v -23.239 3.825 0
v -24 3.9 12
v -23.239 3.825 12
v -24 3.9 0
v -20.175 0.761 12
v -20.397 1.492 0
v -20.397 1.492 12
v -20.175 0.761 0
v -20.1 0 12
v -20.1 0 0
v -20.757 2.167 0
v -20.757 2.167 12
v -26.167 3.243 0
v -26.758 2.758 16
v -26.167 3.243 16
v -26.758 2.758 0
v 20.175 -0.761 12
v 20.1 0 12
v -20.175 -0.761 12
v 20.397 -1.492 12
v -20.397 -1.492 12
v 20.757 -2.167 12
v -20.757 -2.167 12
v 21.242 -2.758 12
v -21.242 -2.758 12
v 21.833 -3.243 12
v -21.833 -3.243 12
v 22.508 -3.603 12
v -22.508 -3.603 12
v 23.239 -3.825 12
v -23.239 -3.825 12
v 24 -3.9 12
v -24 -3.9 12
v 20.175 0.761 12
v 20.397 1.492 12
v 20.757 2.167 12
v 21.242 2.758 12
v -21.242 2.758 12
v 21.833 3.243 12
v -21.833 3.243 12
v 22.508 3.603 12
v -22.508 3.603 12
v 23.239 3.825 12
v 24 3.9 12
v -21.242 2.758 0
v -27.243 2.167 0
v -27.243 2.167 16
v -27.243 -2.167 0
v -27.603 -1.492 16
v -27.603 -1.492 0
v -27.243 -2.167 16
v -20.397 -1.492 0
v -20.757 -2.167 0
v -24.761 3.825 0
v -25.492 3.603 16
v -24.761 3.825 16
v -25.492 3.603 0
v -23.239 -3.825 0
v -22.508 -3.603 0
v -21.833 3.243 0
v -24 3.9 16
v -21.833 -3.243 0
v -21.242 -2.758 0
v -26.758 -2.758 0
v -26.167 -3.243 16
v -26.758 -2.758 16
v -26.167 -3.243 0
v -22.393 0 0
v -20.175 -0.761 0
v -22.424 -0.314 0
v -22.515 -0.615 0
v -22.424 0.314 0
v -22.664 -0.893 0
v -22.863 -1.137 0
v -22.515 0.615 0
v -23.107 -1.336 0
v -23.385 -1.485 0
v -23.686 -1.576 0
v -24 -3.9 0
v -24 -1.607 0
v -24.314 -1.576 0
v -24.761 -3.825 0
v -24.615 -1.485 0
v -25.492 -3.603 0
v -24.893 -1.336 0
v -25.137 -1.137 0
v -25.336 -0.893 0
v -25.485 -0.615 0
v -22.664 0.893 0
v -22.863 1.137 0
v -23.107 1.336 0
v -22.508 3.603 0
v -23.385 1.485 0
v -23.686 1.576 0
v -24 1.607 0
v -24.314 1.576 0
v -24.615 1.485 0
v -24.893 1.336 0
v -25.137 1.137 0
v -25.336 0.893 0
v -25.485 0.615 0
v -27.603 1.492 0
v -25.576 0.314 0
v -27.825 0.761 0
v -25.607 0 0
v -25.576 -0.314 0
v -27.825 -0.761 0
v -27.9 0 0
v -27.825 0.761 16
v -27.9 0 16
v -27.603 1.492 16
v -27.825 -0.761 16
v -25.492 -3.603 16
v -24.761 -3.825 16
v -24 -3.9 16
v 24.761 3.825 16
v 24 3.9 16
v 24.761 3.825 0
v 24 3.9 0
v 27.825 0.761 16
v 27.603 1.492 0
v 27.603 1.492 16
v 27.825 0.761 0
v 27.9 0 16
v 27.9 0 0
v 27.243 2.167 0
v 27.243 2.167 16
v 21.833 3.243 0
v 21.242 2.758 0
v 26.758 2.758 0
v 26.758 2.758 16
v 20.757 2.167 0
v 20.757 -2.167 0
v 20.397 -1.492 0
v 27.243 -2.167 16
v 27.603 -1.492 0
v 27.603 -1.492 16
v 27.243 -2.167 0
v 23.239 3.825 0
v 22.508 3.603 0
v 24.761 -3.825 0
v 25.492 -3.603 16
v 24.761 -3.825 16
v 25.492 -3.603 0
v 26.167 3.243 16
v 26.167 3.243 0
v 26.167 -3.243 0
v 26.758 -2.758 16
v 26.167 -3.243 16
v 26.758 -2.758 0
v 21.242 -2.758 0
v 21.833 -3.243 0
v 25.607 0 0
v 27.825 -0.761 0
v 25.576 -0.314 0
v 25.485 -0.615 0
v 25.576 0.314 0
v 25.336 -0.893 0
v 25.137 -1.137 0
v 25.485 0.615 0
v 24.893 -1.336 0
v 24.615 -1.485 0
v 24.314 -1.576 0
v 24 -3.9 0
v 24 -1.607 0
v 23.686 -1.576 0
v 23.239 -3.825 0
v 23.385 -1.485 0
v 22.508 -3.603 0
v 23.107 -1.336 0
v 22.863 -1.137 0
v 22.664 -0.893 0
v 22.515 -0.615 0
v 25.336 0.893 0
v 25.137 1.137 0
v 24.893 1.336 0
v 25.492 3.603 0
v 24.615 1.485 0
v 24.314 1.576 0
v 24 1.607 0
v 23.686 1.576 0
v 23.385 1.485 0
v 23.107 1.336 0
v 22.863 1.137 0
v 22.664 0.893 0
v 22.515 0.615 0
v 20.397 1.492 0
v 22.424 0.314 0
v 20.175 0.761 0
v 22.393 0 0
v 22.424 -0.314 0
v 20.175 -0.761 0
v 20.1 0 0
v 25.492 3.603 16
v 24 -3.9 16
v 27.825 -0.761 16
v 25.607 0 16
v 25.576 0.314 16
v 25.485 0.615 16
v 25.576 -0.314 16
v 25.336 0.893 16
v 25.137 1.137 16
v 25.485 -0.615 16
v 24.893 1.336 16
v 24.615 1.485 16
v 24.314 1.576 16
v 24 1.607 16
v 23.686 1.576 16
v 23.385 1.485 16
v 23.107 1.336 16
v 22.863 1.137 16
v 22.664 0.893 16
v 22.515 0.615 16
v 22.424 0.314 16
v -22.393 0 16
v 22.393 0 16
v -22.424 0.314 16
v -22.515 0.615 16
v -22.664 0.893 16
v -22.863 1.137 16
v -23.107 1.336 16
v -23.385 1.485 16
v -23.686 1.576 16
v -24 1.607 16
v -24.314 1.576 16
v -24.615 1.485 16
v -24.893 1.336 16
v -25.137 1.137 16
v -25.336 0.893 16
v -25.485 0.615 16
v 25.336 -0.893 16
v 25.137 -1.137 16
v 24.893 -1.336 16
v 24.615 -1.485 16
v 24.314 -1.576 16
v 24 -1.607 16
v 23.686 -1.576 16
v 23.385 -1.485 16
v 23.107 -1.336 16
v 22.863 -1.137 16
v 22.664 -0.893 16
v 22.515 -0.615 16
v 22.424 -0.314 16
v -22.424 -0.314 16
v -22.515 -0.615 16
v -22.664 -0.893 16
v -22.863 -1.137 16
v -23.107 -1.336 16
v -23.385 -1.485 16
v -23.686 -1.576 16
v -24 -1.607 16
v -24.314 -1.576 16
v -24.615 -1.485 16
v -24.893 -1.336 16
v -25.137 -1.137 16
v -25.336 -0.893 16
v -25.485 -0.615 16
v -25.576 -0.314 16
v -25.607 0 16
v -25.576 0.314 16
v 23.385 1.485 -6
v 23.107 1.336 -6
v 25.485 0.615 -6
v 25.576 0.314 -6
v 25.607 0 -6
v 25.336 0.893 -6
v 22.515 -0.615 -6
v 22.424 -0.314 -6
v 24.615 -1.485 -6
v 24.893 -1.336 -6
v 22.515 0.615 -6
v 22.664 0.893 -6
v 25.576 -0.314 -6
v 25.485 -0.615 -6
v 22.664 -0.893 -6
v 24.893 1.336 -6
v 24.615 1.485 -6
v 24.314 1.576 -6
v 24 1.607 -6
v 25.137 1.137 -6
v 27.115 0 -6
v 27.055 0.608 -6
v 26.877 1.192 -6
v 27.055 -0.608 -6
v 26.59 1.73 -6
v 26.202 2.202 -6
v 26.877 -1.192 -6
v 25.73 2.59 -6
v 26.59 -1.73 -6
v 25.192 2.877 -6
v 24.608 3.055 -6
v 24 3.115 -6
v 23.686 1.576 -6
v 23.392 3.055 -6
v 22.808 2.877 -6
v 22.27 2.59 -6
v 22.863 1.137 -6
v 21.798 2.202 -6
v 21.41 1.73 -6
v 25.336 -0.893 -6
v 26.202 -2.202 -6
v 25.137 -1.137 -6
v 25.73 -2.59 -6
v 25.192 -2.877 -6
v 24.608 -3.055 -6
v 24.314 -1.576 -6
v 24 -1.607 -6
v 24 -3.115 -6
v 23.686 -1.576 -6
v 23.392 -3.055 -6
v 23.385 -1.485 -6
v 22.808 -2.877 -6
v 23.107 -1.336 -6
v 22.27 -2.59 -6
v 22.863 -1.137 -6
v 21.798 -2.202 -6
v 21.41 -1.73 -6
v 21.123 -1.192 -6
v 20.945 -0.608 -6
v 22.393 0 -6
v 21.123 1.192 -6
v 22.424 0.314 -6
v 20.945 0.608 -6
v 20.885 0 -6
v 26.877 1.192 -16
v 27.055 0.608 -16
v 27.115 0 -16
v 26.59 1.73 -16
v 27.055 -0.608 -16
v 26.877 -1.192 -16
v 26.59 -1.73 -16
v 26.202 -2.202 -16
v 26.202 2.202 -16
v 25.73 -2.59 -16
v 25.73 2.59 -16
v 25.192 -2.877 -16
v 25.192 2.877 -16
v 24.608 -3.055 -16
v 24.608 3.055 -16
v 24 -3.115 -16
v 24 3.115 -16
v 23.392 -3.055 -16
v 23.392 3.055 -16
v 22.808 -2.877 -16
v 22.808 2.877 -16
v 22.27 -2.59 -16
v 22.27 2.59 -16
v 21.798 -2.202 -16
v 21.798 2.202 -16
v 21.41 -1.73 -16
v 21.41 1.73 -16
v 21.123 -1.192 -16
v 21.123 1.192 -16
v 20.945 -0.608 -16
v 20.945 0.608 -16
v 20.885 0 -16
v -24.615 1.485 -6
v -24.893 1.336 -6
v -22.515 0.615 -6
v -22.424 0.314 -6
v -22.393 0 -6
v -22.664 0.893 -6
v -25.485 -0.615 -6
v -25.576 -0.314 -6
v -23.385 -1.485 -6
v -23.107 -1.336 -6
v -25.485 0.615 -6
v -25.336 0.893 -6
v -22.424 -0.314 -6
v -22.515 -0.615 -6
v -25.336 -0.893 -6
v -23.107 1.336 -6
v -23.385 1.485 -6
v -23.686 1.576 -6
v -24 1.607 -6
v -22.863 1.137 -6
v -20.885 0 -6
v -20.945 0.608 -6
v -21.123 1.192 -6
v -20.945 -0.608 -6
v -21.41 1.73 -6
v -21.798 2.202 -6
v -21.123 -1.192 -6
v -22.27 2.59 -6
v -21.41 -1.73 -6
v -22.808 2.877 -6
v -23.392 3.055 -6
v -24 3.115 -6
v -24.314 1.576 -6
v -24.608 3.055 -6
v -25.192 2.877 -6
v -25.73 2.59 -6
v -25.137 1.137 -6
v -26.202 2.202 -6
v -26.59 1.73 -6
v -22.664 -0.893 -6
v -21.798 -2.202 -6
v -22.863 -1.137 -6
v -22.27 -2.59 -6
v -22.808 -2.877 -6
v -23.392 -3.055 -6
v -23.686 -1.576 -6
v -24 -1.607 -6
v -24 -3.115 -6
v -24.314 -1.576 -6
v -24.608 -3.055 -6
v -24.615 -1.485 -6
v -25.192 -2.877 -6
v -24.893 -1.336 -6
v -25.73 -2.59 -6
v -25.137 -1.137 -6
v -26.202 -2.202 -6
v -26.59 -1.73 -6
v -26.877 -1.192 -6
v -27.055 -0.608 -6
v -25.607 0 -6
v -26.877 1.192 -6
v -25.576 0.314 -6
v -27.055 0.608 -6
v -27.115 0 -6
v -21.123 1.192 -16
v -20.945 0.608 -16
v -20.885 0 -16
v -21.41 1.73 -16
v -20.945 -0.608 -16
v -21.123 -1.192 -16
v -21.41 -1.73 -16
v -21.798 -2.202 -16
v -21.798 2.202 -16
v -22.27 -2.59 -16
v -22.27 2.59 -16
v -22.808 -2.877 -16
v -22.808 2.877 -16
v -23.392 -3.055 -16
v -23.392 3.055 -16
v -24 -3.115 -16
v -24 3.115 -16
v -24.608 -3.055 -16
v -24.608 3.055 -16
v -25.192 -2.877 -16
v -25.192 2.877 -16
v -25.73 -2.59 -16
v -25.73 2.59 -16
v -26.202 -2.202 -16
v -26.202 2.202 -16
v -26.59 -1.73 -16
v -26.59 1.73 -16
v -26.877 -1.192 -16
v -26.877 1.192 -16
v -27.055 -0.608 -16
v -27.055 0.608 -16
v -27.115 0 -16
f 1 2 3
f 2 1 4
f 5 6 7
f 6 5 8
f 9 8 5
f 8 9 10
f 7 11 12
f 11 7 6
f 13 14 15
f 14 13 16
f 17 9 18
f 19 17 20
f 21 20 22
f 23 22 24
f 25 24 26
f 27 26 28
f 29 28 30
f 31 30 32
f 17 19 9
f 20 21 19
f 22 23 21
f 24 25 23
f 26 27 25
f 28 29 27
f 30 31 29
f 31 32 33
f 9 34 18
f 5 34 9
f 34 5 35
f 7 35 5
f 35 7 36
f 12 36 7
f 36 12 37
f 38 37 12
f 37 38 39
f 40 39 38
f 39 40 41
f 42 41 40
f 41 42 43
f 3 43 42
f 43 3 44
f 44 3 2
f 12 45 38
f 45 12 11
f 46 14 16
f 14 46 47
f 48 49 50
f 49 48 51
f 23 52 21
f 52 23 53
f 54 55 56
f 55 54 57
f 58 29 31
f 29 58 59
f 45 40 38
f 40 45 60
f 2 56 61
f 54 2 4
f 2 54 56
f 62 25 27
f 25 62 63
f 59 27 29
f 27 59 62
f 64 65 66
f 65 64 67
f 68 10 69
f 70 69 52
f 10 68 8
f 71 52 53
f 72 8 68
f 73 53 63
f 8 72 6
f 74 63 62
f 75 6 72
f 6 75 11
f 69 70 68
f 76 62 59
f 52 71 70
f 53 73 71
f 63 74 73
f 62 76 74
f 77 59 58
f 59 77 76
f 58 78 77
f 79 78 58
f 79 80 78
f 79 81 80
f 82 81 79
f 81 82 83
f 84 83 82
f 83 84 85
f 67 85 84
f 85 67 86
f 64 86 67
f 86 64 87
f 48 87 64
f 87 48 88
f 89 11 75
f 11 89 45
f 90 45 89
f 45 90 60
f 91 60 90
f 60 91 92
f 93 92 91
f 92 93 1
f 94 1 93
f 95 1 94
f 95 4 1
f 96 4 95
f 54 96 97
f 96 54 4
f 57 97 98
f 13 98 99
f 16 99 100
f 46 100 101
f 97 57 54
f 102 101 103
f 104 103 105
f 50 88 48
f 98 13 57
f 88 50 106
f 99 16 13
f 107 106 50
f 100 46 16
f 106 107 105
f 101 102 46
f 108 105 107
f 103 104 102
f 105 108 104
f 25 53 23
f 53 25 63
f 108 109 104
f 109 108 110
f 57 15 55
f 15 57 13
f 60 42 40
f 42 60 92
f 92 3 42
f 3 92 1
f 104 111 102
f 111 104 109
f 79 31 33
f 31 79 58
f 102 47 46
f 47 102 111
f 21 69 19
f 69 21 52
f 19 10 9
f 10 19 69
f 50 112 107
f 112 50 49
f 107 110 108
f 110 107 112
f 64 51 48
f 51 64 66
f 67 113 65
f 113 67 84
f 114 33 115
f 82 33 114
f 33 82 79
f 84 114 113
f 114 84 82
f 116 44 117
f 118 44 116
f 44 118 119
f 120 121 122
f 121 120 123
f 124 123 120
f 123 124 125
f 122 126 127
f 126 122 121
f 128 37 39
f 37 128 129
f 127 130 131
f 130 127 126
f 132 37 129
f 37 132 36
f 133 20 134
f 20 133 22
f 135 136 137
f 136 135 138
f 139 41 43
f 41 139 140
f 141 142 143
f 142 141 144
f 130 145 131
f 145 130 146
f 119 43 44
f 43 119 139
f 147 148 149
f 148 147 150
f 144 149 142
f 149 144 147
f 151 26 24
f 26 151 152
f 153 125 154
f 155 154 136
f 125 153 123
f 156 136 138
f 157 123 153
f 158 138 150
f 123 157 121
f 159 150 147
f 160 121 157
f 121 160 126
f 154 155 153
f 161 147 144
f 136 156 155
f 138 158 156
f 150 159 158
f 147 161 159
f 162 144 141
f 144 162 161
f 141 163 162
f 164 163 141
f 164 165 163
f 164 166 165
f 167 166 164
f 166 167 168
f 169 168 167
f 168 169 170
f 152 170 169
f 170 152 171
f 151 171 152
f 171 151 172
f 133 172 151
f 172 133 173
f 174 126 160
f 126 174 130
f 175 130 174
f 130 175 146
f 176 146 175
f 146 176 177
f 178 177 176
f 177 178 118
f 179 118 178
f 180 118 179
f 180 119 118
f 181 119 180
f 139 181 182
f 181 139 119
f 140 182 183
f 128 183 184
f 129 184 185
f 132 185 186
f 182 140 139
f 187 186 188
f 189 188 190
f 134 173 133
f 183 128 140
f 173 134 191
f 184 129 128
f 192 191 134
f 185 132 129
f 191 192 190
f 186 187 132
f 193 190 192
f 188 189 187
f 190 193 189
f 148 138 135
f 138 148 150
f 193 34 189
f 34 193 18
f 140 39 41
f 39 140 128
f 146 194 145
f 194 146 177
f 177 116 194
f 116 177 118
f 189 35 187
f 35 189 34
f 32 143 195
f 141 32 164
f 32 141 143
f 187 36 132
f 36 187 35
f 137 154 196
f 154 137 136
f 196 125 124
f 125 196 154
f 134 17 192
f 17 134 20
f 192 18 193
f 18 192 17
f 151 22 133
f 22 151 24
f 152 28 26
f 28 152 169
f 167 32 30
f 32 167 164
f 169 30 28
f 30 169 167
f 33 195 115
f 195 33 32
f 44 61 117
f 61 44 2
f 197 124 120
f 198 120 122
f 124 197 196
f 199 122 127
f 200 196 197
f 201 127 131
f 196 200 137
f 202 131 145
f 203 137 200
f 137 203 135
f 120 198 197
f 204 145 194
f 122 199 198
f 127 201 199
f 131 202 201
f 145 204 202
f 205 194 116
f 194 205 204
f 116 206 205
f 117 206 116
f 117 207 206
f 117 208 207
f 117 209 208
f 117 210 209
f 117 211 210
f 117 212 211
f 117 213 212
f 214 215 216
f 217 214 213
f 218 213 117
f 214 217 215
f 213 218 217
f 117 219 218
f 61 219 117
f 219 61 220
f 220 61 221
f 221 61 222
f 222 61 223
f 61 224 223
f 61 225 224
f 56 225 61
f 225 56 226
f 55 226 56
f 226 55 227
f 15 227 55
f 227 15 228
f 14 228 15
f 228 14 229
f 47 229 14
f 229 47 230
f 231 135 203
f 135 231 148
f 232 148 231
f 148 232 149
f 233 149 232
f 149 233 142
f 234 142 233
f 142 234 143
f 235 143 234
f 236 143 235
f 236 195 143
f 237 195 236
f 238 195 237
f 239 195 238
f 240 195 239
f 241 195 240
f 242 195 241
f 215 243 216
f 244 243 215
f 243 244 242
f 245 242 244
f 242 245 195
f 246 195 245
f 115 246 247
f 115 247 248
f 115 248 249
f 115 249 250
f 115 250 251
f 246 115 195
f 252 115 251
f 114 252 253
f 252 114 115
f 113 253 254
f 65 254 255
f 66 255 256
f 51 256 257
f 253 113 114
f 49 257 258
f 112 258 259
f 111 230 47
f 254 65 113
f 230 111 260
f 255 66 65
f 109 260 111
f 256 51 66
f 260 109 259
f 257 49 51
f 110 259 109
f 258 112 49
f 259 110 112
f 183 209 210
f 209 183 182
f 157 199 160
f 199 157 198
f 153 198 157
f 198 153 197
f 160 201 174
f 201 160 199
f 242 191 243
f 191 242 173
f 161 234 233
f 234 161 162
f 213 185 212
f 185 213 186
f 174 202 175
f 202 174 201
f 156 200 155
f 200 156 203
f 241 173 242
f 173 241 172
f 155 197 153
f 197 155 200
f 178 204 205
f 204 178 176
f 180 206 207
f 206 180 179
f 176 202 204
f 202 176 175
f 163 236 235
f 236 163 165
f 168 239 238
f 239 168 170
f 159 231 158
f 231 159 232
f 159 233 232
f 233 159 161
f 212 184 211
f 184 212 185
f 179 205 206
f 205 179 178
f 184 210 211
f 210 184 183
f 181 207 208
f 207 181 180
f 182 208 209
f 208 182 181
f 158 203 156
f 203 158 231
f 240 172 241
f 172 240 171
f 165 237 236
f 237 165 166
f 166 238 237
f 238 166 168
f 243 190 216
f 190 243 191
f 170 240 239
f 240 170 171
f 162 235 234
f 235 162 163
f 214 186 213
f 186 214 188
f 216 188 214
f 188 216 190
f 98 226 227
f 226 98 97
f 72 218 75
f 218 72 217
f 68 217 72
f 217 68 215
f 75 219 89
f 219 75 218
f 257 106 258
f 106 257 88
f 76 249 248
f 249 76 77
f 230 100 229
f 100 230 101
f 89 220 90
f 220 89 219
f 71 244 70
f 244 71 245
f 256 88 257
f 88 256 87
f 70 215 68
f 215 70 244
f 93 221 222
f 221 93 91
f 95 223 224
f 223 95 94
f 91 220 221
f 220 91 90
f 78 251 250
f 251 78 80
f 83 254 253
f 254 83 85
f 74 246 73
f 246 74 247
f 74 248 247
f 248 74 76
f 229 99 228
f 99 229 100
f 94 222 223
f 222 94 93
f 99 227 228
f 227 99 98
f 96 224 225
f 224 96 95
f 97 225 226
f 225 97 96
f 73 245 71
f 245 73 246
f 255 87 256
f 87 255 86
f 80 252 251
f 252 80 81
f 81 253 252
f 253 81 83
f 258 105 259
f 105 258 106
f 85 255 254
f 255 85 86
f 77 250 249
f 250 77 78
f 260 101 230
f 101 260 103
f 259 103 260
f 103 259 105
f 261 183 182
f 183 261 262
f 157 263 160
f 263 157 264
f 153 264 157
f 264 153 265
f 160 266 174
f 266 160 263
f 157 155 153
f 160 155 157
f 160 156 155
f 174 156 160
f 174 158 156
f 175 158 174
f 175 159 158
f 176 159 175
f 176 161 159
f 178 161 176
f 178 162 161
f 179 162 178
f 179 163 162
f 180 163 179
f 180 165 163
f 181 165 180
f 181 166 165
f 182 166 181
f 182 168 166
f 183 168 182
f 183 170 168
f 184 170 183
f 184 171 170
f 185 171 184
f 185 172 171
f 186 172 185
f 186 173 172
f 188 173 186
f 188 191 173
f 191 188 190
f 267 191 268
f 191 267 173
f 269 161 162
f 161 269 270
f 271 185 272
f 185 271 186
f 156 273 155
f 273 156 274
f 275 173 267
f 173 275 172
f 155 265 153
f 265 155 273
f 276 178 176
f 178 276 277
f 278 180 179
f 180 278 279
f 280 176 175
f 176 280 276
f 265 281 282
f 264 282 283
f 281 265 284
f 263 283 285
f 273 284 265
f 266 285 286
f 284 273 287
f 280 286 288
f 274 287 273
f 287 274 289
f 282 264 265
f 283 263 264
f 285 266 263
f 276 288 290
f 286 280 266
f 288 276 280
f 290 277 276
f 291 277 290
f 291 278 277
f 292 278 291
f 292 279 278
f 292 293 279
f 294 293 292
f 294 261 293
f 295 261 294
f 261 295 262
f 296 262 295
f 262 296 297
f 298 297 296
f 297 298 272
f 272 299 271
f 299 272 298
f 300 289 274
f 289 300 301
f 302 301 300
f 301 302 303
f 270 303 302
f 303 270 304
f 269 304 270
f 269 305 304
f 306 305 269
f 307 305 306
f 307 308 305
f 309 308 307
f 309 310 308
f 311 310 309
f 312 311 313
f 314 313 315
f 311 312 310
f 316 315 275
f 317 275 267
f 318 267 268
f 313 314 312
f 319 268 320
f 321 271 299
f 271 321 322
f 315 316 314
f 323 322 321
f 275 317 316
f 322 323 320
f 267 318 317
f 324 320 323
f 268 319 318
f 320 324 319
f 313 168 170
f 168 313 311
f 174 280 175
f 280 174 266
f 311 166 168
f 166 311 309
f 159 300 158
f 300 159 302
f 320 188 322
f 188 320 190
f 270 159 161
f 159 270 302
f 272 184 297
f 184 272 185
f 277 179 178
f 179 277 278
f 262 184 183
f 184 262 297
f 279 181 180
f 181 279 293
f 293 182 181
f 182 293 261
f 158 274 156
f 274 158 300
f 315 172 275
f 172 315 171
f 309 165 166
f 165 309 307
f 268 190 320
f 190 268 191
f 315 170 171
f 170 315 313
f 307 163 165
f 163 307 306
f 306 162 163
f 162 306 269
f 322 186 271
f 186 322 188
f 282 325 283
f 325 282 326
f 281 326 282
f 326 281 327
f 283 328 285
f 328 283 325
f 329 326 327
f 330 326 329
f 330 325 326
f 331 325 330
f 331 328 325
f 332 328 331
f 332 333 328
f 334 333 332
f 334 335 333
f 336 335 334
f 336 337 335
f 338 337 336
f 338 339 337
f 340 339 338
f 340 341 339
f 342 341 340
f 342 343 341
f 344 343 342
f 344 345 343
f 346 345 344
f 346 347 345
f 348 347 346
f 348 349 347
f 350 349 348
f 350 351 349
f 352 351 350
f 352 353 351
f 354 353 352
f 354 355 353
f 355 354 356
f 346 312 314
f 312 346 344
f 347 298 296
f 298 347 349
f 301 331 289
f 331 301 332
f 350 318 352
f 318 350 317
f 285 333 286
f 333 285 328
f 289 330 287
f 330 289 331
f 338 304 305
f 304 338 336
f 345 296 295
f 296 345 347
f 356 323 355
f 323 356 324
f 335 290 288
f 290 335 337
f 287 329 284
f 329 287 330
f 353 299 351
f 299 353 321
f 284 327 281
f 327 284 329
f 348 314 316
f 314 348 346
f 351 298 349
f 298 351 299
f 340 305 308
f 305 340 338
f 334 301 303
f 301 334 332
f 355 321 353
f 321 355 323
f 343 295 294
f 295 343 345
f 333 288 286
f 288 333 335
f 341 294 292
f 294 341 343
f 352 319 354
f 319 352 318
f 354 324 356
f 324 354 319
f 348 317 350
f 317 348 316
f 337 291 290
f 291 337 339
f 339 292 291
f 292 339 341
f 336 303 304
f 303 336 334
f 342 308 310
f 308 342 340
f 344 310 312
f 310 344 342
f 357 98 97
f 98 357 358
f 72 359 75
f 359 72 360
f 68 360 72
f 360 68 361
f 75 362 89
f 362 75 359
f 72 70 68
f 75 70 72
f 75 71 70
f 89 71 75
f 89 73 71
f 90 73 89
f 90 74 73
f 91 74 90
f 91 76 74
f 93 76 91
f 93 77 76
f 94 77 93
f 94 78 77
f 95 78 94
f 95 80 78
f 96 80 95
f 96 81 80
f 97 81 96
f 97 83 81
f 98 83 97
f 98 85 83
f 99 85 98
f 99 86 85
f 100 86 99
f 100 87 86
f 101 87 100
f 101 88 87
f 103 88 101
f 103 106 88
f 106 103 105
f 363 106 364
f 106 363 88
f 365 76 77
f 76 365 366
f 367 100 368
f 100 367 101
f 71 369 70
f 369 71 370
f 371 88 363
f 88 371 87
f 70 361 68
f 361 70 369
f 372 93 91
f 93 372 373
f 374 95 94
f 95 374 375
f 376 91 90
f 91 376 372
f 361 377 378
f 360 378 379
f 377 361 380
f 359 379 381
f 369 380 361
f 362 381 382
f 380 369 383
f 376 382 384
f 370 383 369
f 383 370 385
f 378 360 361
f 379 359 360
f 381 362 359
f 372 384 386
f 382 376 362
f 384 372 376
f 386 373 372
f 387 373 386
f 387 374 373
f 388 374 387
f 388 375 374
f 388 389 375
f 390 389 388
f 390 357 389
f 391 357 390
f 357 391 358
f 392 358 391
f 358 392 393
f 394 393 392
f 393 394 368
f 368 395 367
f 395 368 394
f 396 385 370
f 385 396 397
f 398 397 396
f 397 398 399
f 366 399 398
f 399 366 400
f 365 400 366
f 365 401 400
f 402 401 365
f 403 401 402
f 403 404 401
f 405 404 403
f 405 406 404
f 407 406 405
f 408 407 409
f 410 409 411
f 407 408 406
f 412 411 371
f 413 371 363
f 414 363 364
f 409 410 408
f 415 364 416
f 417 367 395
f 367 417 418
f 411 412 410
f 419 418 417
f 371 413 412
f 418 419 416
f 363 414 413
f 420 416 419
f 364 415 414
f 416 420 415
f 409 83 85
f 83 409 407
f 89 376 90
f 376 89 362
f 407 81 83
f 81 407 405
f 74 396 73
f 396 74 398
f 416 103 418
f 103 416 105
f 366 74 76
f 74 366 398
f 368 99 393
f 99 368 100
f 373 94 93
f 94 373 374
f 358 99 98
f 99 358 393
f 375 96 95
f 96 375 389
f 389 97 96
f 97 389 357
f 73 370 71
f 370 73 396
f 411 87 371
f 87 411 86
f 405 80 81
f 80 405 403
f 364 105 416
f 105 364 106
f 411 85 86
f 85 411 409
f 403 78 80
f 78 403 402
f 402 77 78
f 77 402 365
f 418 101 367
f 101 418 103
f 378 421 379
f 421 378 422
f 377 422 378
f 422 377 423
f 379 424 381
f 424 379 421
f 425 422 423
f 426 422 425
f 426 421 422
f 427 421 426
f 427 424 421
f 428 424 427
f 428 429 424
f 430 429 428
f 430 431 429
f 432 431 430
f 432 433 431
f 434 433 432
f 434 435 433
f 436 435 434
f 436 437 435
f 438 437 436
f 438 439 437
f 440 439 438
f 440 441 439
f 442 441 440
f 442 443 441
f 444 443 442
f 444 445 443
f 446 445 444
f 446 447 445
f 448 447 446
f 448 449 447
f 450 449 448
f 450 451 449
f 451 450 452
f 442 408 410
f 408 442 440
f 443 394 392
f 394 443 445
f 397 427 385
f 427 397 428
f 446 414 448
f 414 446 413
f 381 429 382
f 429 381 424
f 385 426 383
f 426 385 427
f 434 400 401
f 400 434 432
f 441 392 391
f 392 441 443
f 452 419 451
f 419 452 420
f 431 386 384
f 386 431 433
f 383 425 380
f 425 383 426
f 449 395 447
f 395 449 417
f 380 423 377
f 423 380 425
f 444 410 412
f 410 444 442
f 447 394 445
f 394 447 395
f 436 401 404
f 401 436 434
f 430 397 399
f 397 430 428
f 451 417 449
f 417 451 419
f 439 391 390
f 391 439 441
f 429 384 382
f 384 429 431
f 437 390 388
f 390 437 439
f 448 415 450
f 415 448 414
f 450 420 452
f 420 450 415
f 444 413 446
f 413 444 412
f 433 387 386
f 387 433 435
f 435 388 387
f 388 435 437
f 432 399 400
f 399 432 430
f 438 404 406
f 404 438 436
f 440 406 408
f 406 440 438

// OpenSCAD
// file: zcube.scad
// This function creates a cube with a given x/y either above (f=1) or below (f=-1) the z axis.
module zcube(dimensions, z=0, f=1) {
	translate([0, 0, dimensions[2]/2 * f + z]) cube(dimensions, true);
}

module zring(dimensions, thickness, z=0, f=1) {
	render() difference() {
		zcube([dimensions[0]+thickness/2, dimensions[1]+thickness/2, dimensions[2]], z=z, f=f);
		zcube([dimensions[0]-thickness/2, dimensions[1]-thickness/2, dimensions[2]], z=z, f=f);
	}
}

module rcube(dimensions, d = 1, z=0, f=1) {
	dx = dimensions[0]/2 - d/2;
	dy = dimensions[1]/2 - d/2;
	dz = dimensions[2]/2 * (f-1) + z;
	
	hull() {
		translate([-dx, -dy, dz]) cylinder(h=dimensions[2], d=d);
		translate([-dx, dy, dz]) cylinder(h=dimensions[2], d=d);
		translate([dx, -dy, dz]) cylinder(h=dimensions[2], d=d);
		translate([dx, dy, dz]) cylinder(h=dimensions[2], d=d);
	}
}

module zcorners() {
	children();
	mirror([1, 0, 0]) children();
	mirror([0, 1, 0]) children();
	mirror([1, 0, 0]) mirror([0, 1, 0]) children();
}

module reflect(axis = [1, 0, 0]) {
	children();
	mirror(axis) children();
}

module zsides(dimensions, thickness, inset=0) {
	difference() {
		zcube(dimensions + [thickness*2, thickness*2, 0]);
		zcube(dimensions);
	}
}
// file: bolts.scad
$radial_error = 0.1;

$fn = $preview ? 12 : 32;

ISO262_COARSE_PITCH = [
	[1.0, 0.25],
	[1.2, 0.25],
	[1.4, 0.2],
	[1.6, 0.35],
	[1.8, 0.2],
	[2.0, 0.4],
	[2.5, 0.45],
	[3.0, 0.5],
	[3.5, 0.35],
	[4.0, 0.7],
	[5.0, 0.8],
	[6.0, 1.0],
	[7.0, 0.75],
	[8.0, 1.25],
	[10.0, 1.5],
	[12.0, 1.75],
	[14.0, 1.5],
	[16.0, 2.0],
	[30.0, 3.5],
	[42.0, 4.5],
	[56.0, 5.5]
];

function screw_pitch(d) = lookup(d, ISO262_COARSE_PITCH);

module cylinder_outer(height, radius, fn=$fn, radial_error=$radial_error) {
	fudge = 1/cos(180/fn);
	cylinder(h=height,r=radius*fudge+$radial_error, $fn=fn);
}

module cylinder_inner(height, radius, fn=$fn) {
	cylinder(h=height,r=radius-$radial_error,$fn=fn);
}

// Make a hole. The diameter is the size of the screw (e.g. 3 for M3). Depth is how far the hole should go for the thread, and inset is how far out there should be a hole for the head to go.
module hole(diameter=3, depth=6, inset=10, pitch=0) {
	cylinder_outer(depth, (diameter-pitch)/2);
	translate([0, 0, depth]) cylinder_outer(inset, diameter, 32);
}

module threaded_hole(diameter=3, depth=6, inset=10) {
	hole(diameter, depth, inset, screw_pitch(diameter));
}

module countersunk_hole(diameter=3, depth=6, inset=10, pitch=0) {
	hole(diameter, depth, inset, pitch);
	translate([0, 0, depth-diameter/2]) cylinder(r1=diameter/2+$radial_error, r2=diameter+$radial_error, h=diameter/2);
}

module knurled_insert(diameter = 3, depth = 6, thickness = 1) {
	cylinder_inner(depth, diameter/2 + thickness);
}

module knurled_hole(diameter = 3, depth = 6, inset = 10, insert = 4, thickness = 1) {
	hole(diameter, depth, inset);
	
	knurled_insert(diameter, insert, thickness);
}

module countersunk_knurled_hole(diameter = 3, depth = 6, inset = 10, insert = 4, thickness = 1) {
	countersunk_hole(diameter, depth, inset);
	
	knurled_insert(diameter, insert, thickness);
}

// Make a hole for a bolt/screw combination.
module bolted_hole(diameter=3, depth=8, nut_offset=2, shaft_length=10, inset=10) {
	hole(diameter, depth, inset);
	hull() {
		shaft_width = diameter;
		translate([0, 0, nut_offset]) rotate(360/12, [0, 0, 1]) cylinder_outer(diameter, shaft_width, 6);
		translate([0, shaft_length, nut_offset]) rotate(360/12, [0, 0, 1]) cylinder_outer(diameter, shaft_width, 6);
	}
}

module countersunk_bolted_hole(diameter=3, depth=8, nut_offset=2, shaft_length=10, inset=10) {
	countersunk_hole(diameter, depth, inset);
	hull() {
		shaft_width = diameter;
		translate([0, 0, nut_offset]) rotate(360/12, [0, 0, 1]) cylinder_outer(diameter, shaft_width, 6);
		translate([0, shaft_length, nut_offset]) rotate(360/12, [0, 0, 1]) cylinder_outer(diameter, shaft_width, 6);
	}
}

module mounting_hole(diameter=3, depth=6, inset=10, outset=3) {
	difference() {
		cylinder_outer(depth, diameter/2+outset);
		hole(diameter=diameter, depth=depth, inset=inset);
	}
}

render() rotate(90, [1, 0, 0]) difference() {
	cube([40, 10, 10]);
	translate([5, 5, 0]) bolted_hole(diameter=3, depth=8);
	translate([15, 5, 0]) bolted_hole(diameter=4, depth=8);
	translate([25, 5, 0]) countersunk_hole(diameter=4, depth=8);
	translate([35, 5, 0]) knurled_hole();
}
// main file
use <bolts.scad>;
use <zcube.scad>;

module cable_clamp(width = 48, height = 12) {
	difference() {
		union() {
			hull() {
				for (offset = [-width/2:width:width]) {
					translate([offset, 0, height]) cylinder_inner(4, 4);
				}
			}
			
			for (offset = [-width/2:width:width]) {
				translate([offset, 0, 0]) cylinder_inner(12, 4);
			}
		}
		
		translate([width/2, 0, 0]) hole(3, 18);
		translate([-width/2, 0, 0]) hole(3, 18);
	}
}

module cable_clamp_cutout(width = 48, height = 12) {
	mirror([0, 0, 1]) {
		translate([width/2, 0, 0]) hole(3, 6);
		translate([-width/2, 0, 0]) hole(3, 6);
	}
}

cable_clamp();
cable_clamp_cutout();
